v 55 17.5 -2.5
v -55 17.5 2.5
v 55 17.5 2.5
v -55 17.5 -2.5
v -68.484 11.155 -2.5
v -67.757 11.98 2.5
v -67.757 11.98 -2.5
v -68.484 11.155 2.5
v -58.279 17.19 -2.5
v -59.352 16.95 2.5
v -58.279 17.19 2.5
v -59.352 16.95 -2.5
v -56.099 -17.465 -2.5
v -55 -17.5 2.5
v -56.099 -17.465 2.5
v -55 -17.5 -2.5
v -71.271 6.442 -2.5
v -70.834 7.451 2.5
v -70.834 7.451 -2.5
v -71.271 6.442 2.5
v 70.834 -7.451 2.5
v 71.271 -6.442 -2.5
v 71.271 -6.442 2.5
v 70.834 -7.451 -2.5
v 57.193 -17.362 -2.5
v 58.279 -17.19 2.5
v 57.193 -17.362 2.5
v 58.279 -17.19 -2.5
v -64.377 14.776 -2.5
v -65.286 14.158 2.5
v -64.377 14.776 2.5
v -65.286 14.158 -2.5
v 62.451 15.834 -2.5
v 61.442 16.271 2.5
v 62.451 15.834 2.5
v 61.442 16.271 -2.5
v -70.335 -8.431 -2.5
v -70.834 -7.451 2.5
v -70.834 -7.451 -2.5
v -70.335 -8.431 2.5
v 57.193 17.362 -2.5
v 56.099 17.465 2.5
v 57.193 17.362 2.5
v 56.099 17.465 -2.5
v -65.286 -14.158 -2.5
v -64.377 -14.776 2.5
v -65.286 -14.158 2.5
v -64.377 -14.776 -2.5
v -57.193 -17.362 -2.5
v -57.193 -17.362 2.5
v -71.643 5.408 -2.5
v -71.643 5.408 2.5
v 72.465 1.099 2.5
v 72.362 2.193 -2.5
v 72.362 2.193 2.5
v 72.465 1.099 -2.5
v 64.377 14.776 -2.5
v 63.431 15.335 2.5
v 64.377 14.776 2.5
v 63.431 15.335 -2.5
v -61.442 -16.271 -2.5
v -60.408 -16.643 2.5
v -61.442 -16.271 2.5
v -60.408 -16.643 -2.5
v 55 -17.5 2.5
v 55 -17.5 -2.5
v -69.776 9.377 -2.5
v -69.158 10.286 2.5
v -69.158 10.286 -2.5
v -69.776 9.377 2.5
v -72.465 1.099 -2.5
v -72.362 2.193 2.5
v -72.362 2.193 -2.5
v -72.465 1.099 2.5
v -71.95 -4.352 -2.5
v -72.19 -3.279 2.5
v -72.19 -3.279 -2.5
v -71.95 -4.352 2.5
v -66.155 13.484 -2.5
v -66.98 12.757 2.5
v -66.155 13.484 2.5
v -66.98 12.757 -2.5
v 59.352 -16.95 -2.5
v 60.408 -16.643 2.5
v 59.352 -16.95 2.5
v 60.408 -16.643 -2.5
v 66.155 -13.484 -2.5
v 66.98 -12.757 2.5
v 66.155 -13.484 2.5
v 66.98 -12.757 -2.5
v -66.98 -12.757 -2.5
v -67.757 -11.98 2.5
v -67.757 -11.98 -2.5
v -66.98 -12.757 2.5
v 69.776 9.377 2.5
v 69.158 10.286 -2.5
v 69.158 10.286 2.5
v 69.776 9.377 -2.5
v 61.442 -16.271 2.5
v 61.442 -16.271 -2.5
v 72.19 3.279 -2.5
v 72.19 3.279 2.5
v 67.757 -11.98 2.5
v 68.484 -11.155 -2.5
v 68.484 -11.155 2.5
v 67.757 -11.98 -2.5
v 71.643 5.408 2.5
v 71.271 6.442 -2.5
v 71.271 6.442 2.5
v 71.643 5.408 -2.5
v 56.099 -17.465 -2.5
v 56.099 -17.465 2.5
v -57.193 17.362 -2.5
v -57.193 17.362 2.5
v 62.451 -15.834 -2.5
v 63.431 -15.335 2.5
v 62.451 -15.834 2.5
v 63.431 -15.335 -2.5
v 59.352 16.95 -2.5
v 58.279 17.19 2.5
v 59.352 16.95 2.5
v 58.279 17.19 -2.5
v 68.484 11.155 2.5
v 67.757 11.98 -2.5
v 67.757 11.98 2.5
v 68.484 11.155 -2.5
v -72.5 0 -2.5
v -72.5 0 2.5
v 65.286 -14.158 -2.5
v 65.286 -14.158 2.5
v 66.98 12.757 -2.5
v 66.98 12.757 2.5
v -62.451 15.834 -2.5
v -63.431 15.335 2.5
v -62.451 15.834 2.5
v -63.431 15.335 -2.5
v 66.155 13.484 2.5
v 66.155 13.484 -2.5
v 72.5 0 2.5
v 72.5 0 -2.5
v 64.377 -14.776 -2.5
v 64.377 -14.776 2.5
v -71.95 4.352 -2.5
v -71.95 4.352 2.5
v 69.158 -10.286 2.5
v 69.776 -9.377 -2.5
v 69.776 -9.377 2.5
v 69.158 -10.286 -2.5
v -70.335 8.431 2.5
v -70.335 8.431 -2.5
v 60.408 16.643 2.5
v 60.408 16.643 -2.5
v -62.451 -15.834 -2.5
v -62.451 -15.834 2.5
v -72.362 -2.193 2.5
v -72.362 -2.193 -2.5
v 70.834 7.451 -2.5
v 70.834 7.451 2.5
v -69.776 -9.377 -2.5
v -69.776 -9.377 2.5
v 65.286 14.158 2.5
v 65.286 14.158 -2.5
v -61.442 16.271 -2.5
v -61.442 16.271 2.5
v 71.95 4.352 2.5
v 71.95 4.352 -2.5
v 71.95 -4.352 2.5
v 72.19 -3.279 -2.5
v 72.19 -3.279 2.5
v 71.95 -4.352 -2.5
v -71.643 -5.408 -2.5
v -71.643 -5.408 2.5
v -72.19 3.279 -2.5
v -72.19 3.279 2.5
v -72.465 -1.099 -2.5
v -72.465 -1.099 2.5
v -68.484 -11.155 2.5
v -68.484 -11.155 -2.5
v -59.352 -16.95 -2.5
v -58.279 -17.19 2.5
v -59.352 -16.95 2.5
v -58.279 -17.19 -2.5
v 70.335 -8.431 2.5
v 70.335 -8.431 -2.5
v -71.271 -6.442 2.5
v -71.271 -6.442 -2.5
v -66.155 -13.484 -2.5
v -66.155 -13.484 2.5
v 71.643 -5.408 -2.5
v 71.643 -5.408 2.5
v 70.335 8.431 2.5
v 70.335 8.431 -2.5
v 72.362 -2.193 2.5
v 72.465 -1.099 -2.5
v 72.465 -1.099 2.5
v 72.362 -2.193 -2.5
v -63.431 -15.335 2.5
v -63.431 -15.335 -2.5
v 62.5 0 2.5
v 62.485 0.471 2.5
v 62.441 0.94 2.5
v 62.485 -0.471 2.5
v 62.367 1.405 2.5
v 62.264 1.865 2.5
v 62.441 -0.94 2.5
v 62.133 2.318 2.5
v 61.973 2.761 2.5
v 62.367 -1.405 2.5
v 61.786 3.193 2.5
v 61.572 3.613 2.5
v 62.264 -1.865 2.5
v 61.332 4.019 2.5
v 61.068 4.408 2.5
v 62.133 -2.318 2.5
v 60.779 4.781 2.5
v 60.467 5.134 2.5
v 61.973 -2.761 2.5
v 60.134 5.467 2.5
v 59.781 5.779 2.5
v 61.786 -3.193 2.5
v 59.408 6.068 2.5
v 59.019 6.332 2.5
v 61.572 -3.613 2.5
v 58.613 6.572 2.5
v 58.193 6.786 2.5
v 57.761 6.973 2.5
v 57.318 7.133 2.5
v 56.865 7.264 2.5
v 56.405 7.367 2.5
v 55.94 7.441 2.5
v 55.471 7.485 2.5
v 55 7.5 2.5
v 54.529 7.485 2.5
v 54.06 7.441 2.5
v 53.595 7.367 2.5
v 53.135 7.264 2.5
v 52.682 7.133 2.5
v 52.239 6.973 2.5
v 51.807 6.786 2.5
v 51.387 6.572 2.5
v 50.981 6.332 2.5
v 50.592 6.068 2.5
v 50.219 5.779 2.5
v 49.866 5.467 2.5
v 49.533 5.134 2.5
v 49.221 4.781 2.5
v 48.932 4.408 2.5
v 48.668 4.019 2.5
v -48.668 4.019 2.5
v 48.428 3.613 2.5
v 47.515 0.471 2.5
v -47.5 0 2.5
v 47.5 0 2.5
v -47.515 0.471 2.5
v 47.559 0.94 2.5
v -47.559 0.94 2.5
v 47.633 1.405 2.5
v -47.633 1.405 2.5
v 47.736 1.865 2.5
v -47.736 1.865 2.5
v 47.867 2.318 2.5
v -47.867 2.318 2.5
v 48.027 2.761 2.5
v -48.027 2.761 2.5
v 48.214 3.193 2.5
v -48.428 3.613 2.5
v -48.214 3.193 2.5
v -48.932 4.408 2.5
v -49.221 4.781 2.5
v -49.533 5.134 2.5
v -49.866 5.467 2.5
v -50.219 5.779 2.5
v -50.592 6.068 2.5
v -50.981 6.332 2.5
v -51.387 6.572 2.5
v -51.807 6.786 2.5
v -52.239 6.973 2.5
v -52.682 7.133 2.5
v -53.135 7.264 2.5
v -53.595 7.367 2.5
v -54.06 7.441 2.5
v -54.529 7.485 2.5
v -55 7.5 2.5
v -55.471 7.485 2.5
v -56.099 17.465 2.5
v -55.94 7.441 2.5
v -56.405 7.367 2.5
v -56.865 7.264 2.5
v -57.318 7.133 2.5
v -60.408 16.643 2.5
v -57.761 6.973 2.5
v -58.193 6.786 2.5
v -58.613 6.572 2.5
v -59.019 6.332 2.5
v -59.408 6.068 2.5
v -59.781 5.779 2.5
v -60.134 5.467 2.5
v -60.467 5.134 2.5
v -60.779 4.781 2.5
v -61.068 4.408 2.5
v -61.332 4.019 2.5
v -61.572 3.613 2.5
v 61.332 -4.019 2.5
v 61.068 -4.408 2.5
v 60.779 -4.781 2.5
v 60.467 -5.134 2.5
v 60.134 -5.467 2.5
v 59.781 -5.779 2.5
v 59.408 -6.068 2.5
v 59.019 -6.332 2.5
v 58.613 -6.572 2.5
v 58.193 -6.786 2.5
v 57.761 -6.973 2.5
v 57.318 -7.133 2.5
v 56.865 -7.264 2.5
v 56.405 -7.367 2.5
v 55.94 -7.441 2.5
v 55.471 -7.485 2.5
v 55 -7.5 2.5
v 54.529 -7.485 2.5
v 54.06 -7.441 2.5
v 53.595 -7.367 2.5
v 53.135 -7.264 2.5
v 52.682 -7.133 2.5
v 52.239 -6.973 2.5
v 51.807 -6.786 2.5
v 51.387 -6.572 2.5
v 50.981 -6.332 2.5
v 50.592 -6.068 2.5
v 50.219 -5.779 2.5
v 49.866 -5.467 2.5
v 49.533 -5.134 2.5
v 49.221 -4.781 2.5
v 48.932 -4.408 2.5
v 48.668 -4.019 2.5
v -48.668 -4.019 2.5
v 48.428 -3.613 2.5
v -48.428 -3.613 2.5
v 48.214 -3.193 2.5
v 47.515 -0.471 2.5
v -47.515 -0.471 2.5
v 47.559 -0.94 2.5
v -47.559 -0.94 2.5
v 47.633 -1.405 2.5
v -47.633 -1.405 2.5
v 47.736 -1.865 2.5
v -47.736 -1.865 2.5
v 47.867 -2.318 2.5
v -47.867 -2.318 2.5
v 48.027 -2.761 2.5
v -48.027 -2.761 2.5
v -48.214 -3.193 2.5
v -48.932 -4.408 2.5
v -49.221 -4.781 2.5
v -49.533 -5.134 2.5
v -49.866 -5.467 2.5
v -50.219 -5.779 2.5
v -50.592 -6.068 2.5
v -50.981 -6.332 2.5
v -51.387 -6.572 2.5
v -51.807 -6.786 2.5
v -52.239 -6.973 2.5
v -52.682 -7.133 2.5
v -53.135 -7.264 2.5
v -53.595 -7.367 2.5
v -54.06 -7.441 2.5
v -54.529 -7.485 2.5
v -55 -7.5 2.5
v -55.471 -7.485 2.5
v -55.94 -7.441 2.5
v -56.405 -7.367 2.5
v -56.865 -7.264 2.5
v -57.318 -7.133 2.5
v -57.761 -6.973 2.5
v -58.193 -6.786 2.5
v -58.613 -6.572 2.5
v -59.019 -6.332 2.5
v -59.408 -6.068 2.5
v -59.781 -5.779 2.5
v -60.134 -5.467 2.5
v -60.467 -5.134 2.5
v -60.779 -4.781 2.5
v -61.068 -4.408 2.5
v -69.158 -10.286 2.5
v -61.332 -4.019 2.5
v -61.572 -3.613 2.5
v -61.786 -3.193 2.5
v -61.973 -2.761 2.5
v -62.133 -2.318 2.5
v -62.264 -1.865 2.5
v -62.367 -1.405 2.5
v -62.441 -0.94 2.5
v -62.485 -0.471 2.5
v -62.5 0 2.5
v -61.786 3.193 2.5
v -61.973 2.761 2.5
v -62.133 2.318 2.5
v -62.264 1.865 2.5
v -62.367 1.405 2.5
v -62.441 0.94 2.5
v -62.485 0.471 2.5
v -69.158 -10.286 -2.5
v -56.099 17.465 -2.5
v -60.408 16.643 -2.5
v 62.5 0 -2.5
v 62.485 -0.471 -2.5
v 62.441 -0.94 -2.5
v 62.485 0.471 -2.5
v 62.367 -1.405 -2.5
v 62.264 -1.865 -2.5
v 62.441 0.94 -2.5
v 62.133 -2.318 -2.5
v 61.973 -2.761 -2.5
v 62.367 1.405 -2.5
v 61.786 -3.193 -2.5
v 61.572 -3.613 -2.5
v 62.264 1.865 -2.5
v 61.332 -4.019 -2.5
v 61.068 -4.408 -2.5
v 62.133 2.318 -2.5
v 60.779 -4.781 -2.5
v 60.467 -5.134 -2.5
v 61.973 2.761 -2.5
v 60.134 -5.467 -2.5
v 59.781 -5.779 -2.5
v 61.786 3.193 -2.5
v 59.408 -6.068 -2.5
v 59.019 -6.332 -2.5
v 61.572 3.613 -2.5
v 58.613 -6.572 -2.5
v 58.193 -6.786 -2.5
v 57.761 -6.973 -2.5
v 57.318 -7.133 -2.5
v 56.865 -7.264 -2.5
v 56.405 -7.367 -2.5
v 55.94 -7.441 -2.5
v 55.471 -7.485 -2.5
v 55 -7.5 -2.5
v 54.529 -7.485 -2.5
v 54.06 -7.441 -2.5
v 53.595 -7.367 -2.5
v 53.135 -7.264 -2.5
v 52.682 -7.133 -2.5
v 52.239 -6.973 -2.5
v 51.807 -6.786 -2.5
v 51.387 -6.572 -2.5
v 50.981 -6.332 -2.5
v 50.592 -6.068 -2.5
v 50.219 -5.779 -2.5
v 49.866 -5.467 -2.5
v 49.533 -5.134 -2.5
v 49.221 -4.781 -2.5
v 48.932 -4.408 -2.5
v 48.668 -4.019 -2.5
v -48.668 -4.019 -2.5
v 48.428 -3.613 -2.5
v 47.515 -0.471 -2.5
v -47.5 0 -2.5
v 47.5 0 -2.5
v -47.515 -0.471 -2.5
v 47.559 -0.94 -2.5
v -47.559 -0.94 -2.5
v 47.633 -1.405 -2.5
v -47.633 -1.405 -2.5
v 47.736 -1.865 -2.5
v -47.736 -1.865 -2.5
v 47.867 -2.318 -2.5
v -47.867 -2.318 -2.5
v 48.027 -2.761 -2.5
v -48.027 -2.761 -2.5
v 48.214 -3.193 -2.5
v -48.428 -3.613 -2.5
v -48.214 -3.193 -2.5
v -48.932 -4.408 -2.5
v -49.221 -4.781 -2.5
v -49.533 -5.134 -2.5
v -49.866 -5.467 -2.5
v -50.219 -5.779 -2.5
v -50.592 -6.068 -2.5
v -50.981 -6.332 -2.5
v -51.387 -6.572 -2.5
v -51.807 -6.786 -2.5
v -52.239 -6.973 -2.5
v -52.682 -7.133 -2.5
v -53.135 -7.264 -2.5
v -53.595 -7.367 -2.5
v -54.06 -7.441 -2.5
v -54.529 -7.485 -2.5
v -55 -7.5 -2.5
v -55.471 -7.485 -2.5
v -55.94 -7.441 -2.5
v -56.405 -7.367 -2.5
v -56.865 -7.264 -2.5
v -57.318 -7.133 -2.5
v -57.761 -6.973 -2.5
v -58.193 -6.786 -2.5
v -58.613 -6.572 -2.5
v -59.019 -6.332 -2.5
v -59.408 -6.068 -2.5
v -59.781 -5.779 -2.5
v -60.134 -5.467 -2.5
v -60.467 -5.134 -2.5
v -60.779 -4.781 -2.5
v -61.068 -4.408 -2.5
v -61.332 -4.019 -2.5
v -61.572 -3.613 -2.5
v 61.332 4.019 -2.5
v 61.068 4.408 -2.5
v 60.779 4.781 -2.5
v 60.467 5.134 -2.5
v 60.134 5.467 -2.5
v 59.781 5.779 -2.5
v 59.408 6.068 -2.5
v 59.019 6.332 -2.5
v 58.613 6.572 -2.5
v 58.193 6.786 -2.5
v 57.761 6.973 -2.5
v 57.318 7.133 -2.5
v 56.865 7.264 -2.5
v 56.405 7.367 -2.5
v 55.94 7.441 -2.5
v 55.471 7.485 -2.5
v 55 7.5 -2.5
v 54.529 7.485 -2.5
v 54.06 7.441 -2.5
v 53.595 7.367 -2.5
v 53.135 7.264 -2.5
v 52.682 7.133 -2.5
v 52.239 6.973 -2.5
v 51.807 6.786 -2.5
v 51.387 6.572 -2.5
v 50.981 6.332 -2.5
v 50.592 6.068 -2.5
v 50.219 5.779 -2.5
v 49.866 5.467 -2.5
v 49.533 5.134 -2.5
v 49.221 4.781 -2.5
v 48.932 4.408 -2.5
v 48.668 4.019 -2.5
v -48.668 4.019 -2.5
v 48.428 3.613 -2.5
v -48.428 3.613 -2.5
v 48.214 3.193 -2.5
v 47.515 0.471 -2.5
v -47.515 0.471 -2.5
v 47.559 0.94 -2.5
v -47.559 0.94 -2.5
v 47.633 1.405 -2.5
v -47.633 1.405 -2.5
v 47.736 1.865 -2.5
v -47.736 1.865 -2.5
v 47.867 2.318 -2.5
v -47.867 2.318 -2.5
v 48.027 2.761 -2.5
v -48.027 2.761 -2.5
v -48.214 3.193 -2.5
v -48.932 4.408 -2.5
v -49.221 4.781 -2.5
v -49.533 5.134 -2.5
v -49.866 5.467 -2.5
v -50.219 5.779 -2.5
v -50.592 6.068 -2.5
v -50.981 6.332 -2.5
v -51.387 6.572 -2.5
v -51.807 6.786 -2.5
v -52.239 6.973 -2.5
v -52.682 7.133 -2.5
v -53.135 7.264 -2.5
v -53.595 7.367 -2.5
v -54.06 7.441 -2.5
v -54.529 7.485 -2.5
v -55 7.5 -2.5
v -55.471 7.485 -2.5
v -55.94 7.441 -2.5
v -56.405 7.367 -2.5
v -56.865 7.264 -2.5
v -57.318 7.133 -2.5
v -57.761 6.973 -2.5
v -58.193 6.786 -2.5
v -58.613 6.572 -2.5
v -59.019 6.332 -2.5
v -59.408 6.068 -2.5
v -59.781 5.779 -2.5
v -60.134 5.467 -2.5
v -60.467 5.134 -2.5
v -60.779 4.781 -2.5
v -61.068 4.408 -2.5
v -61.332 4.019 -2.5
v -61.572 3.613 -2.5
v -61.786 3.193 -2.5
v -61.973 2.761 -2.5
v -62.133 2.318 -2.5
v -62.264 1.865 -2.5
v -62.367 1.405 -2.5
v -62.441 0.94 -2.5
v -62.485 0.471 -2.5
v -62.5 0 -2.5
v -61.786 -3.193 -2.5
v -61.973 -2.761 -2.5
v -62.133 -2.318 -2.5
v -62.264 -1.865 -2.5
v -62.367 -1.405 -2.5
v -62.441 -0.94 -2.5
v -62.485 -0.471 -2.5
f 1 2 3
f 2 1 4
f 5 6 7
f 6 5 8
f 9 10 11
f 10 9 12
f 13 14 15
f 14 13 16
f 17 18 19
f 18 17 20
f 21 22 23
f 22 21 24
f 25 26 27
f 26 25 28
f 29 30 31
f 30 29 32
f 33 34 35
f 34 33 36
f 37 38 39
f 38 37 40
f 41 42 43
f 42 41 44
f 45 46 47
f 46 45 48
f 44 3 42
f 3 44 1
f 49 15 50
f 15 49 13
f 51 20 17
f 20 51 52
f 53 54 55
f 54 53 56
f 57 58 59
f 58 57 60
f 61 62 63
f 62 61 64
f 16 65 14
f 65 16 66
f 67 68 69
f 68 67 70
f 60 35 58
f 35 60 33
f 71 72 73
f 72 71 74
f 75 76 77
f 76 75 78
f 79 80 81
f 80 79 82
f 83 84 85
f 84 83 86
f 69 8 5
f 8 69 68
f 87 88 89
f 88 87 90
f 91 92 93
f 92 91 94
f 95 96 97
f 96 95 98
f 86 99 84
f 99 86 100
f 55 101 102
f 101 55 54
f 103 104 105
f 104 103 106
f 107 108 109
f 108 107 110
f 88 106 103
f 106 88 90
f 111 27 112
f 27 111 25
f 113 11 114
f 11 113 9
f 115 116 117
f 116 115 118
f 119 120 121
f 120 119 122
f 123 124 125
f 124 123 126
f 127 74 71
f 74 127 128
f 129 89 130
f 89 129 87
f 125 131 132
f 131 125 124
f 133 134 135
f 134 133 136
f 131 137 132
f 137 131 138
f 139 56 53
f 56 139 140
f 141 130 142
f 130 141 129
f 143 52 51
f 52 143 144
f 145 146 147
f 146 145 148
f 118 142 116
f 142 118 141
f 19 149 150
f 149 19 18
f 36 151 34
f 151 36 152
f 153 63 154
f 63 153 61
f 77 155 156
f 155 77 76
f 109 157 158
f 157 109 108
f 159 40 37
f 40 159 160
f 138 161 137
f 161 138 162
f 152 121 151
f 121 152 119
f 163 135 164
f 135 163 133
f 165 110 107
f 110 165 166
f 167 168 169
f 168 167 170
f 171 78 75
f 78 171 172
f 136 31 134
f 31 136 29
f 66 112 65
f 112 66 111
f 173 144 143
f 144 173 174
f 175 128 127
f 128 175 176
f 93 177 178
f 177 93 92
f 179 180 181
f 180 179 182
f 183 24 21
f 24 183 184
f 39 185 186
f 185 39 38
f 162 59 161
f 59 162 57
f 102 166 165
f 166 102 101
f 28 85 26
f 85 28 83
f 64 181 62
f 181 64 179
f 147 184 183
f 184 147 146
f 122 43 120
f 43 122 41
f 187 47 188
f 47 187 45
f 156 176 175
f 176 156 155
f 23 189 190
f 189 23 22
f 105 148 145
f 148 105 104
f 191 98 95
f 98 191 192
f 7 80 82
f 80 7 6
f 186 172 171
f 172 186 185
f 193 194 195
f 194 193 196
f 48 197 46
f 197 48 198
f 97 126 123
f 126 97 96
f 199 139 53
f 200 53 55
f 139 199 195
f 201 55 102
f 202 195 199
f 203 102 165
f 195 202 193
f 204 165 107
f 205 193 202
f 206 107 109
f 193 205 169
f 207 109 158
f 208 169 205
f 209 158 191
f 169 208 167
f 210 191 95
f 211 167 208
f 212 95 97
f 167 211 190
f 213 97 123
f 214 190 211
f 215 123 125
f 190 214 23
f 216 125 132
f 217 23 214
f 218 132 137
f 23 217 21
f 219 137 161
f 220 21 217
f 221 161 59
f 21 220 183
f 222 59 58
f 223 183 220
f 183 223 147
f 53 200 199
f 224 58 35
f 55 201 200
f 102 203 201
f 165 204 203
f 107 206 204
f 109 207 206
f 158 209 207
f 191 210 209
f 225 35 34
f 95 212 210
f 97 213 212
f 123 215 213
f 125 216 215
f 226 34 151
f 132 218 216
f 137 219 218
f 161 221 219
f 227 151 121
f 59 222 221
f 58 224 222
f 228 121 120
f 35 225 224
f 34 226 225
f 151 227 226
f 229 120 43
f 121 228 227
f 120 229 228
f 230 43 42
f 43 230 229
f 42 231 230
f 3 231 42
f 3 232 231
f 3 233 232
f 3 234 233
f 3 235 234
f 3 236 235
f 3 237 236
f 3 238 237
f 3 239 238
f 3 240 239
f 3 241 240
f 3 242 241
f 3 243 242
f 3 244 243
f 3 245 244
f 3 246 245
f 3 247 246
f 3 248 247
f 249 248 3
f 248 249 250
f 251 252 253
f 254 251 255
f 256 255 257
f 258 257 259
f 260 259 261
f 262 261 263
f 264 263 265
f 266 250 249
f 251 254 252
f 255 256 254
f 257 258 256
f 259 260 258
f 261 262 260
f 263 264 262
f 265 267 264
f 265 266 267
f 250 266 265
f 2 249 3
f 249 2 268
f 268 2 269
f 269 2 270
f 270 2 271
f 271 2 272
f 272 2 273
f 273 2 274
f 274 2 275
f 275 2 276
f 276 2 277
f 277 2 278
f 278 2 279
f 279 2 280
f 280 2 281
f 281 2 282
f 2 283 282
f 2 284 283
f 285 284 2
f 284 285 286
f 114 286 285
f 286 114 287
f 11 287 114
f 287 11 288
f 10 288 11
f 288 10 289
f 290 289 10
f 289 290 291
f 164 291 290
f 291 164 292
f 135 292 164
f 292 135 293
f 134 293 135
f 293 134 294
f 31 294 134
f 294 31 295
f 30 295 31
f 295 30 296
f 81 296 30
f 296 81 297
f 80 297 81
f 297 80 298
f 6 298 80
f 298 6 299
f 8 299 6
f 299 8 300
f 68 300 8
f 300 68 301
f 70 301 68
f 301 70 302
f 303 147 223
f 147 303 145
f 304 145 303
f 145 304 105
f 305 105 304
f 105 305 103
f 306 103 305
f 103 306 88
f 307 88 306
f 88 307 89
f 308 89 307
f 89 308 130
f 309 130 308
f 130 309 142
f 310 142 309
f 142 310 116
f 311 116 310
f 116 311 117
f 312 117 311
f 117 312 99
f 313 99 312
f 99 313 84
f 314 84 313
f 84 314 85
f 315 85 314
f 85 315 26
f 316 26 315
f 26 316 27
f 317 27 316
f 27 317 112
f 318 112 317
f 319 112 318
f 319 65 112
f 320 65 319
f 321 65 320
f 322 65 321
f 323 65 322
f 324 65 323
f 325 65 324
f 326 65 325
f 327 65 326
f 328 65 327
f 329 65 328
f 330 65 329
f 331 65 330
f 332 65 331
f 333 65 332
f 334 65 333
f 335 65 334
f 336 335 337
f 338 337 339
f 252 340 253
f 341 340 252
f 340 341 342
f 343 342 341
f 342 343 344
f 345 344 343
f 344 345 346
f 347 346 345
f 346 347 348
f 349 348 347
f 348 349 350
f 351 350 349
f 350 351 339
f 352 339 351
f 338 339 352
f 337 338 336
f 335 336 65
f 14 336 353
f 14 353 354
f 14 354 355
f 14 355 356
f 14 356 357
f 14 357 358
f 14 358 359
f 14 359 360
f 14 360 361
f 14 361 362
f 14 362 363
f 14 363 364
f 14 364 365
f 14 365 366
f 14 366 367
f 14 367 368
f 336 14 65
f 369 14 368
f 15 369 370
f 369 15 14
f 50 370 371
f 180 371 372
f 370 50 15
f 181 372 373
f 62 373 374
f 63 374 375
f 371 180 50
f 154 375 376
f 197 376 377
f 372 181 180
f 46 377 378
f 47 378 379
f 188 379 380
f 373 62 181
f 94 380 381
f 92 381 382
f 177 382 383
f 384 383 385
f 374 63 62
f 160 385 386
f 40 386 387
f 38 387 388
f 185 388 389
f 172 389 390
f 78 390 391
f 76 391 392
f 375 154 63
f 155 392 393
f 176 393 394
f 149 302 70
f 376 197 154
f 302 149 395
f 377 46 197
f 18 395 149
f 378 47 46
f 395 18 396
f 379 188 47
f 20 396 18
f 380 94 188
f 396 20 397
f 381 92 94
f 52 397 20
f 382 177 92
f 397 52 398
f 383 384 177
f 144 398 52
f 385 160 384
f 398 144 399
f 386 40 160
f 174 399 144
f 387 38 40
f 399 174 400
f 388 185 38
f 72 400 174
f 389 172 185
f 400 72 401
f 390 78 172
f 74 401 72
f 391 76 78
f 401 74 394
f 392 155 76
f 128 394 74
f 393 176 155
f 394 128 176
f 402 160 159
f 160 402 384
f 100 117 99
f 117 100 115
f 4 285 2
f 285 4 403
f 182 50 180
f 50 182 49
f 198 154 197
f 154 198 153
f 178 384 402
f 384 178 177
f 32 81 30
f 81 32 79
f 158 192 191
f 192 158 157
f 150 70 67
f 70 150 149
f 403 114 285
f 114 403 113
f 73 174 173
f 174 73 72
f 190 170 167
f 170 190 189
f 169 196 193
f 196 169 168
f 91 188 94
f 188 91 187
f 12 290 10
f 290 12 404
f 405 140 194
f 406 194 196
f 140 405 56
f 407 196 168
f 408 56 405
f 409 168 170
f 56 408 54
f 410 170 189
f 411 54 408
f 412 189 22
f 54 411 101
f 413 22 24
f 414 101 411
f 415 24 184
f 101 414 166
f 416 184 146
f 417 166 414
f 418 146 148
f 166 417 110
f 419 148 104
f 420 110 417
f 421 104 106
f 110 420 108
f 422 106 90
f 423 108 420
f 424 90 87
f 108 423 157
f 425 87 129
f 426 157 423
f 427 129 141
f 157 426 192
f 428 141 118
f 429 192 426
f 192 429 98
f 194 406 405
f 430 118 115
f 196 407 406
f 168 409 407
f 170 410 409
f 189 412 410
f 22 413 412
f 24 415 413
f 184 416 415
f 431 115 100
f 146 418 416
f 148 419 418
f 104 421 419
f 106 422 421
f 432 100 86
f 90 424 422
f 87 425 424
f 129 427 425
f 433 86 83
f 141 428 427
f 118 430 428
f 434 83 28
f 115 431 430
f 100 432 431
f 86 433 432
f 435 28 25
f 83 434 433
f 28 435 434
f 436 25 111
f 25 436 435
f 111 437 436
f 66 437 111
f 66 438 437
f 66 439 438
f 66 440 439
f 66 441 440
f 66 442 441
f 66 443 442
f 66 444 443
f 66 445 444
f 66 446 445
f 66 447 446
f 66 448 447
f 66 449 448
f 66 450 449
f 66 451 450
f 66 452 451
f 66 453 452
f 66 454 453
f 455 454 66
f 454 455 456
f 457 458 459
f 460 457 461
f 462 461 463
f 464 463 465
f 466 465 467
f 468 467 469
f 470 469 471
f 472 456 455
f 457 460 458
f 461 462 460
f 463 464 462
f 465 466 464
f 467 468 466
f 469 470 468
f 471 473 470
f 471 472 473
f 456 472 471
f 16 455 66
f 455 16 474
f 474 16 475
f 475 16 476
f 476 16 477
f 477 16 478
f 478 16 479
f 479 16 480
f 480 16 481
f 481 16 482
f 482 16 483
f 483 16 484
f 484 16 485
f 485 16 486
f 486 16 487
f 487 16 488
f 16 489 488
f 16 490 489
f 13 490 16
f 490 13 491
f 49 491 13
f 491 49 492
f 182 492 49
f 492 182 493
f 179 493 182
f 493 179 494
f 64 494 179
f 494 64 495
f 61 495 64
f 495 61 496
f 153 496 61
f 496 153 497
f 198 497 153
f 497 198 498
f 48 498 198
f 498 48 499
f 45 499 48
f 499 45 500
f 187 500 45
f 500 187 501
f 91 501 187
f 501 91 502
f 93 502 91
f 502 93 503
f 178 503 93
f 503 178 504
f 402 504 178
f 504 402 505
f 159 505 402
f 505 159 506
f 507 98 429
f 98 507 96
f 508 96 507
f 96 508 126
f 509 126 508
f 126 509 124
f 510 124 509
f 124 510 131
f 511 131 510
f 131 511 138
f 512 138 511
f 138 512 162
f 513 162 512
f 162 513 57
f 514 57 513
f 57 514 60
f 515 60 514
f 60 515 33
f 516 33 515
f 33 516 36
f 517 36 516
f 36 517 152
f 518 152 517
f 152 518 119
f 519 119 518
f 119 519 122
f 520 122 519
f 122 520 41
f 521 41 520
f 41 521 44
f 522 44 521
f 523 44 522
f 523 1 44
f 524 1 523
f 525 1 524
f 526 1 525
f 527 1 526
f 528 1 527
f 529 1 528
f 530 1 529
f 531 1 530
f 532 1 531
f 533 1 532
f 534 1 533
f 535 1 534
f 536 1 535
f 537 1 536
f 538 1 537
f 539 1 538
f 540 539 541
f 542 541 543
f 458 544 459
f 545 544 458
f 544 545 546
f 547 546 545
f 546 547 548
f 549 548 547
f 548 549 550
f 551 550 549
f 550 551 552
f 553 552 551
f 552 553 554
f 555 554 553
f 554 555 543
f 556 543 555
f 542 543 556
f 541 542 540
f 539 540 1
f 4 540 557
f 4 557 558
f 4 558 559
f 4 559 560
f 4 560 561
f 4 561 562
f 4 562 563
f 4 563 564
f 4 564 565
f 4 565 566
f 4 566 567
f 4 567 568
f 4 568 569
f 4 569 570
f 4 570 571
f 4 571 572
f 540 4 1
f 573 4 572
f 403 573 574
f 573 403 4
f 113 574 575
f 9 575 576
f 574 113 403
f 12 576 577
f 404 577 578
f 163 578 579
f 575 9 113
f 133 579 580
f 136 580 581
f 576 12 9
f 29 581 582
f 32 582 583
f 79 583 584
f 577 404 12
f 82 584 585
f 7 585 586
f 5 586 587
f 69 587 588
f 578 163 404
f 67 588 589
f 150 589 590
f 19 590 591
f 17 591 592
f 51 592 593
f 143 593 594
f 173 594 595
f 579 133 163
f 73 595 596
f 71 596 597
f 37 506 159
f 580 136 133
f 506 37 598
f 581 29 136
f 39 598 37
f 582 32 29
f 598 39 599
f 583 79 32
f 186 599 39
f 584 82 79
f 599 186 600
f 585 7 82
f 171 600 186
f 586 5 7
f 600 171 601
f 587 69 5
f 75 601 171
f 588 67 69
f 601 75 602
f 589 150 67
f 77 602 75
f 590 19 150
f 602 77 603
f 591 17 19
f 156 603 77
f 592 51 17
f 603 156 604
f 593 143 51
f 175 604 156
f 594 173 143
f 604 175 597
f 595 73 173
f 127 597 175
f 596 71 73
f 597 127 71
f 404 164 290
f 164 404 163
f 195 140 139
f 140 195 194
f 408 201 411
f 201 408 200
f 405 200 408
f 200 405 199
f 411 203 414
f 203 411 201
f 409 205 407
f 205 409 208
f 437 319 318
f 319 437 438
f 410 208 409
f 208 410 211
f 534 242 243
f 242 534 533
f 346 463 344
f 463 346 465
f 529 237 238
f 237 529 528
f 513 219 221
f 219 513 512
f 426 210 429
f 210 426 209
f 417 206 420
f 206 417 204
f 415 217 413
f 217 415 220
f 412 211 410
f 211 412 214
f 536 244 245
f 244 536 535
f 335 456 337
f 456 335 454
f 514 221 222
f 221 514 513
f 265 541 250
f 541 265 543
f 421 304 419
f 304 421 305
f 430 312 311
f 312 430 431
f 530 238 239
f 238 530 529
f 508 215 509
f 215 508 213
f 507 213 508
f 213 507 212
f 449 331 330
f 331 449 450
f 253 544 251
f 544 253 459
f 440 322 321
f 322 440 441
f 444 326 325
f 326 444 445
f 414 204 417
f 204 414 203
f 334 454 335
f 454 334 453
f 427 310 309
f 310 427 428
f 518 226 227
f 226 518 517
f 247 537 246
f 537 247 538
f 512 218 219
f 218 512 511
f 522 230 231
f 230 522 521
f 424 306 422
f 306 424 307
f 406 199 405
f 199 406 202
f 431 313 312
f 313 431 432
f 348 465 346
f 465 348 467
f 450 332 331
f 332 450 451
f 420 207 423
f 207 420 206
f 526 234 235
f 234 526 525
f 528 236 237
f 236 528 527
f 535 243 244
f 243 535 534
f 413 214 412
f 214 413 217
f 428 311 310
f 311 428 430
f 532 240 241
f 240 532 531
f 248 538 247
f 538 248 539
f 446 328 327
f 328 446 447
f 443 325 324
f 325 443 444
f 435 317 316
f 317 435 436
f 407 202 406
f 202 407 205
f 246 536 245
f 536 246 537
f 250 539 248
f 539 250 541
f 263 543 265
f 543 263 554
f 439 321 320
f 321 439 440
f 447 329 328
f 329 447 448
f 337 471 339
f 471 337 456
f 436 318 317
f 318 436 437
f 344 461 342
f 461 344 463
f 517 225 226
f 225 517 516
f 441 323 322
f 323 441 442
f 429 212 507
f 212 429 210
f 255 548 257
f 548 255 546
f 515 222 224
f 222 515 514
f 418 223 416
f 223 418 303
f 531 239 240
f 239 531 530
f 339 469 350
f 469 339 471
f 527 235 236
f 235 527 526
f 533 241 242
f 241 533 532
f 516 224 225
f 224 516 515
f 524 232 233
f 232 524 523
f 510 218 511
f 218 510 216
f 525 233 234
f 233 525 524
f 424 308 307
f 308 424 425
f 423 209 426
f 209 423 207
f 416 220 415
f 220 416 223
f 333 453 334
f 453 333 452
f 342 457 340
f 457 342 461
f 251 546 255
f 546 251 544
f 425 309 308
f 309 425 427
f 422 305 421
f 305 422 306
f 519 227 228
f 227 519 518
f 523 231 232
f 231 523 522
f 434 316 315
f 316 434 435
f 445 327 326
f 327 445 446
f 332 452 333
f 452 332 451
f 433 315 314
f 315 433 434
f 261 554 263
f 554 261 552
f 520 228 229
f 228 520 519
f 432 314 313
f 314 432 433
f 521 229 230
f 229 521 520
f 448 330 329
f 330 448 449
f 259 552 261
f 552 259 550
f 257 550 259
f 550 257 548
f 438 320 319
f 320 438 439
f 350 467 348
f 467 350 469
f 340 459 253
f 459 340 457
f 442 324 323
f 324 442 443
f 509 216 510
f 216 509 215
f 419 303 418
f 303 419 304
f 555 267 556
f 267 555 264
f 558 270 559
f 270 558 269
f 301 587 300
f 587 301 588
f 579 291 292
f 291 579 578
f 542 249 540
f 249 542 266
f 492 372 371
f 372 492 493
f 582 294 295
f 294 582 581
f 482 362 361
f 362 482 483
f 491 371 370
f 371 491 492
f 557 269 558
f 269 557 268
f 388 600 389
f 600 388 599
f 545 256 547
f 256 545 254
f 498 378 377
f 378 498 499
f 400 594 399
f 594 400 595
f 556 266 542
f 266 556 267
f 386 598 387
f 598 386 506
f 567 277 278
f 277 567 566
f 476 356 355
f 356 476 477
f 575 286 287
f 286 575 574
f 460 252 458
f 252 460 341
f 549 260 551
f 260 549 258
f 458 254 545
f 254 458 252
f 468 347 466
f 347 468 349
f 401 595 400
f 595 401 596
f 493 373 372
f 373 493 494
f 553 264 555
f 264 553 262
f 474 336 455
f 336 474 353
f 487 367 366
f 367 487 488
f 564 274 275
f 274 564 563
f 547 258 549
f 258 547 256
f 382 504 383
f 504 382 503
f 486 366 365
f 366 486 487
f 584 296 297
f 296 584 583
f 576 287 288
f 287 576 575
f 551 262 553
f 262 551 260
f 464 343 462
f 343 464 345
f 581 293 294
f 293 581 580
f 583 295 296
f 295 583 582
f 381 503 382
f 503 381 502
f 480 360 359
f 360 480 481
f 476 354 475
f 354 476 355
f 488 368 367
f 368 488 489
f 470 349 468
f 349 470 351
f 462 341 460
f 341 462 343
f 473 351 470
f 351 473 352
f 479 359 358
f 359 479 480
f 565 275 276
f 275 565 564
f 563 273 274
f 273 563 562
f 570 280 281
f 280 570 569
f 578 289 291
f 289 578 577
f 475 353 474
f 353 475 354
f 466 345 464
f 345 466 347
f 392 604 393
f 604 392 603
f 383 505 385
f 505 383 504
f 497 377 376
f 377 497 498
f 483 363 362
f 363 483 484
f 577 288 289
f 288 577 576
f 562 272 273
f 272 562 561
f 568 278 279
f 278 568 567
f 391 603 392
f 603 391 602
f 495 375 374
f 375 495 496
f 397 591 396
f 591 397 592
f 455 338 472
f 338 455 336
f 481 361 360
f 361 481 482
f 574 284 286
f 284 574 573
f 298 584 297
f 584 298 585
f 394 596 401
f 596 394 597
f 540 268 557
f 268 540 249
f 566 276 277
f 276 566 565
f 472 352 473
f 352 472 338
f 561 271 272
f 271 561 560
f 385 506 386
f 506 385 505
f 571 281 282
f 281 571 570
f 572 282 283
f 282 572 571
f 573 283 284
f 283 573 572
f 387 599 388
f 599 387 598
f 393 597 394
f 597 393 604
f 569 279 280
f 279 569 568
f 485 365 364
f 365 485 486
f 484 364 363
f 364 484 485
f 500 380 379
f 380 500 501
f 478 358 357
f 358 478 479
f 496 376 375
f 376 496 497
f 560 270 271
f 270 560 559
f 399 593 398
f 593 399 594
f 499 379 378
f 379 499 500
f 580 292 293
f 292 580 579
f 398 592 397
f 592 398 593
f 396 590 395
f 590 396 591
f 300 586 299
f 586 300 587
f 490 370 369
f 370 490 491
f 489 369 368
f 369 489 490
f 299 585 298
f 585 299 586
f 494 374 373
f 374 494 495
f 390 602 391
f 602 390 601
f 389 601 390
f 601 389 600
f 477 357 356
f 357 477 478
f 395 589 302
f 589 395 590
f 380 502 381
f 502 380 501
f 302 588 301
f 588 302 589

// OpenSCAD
$fn=100;
 

module bottom_1(){
    difference(){
        union(){
            hull(){
                translate([55,0,0]) cylinder(d=35,h=5,center=true);
                translate([-55,0,0]) cylinder(d=35,h=5,center=true);
            }

        }
        translate([55,0,0]) cylinder(d=15,h=10,center=true);
        translate([-55,0,0]) cylinder(d=15,h=10,center=true);
        //translate([0,-7,0]) #cube([20,4,6],center=true);
    }  
}
module bottom_2(){
   translate([0,0,0]){
      {
           cylinder(d=16,h=58,center=true);
           cylinder(d=14.5,h=88,center=true);
       }
 
   }
}
module bottom_3(){
    rotate_extrude() translate([7.5,0]) {
        //square([2.5,10]);
        polygon([[0,0],[3,0],[2.5,4],[3,8],[0,8]]);
    }
}


rotate([0,0,0]) union(){
    #hull(){
        cylinder(d1=90,d2=90,h=230);
        translate([200,0,0]) cylinder(d1=90,d2=80,h=230);
    }
    translate([100,0,115]) {
        rotate([90,0,0]){ 
            translate([0,0,-68/2])  rotate_extrude() translate([58/2,0]) square([70,68],center=false);            
            //translate([55,-95,0]) cylinder(d=20,h=90,center=true);
            //translate([-55,-95,0]) cylinder(d=20,h=90,center=true);
            translate([0,-95,0]){
                translate([0,0,42]) !bottom_1();
                translate([0,0,-42])   bottom_1();
                translate([55,0,0]) {
                    bottom_2();
                    translate([0,0,30]) bottom_3();
                }
                translate([-55,0,0]) bottom_2();
                
            }
            
            
        }
        //translate([0,0,-95]) cube([120,20,20],center=true);
    }
}

 
